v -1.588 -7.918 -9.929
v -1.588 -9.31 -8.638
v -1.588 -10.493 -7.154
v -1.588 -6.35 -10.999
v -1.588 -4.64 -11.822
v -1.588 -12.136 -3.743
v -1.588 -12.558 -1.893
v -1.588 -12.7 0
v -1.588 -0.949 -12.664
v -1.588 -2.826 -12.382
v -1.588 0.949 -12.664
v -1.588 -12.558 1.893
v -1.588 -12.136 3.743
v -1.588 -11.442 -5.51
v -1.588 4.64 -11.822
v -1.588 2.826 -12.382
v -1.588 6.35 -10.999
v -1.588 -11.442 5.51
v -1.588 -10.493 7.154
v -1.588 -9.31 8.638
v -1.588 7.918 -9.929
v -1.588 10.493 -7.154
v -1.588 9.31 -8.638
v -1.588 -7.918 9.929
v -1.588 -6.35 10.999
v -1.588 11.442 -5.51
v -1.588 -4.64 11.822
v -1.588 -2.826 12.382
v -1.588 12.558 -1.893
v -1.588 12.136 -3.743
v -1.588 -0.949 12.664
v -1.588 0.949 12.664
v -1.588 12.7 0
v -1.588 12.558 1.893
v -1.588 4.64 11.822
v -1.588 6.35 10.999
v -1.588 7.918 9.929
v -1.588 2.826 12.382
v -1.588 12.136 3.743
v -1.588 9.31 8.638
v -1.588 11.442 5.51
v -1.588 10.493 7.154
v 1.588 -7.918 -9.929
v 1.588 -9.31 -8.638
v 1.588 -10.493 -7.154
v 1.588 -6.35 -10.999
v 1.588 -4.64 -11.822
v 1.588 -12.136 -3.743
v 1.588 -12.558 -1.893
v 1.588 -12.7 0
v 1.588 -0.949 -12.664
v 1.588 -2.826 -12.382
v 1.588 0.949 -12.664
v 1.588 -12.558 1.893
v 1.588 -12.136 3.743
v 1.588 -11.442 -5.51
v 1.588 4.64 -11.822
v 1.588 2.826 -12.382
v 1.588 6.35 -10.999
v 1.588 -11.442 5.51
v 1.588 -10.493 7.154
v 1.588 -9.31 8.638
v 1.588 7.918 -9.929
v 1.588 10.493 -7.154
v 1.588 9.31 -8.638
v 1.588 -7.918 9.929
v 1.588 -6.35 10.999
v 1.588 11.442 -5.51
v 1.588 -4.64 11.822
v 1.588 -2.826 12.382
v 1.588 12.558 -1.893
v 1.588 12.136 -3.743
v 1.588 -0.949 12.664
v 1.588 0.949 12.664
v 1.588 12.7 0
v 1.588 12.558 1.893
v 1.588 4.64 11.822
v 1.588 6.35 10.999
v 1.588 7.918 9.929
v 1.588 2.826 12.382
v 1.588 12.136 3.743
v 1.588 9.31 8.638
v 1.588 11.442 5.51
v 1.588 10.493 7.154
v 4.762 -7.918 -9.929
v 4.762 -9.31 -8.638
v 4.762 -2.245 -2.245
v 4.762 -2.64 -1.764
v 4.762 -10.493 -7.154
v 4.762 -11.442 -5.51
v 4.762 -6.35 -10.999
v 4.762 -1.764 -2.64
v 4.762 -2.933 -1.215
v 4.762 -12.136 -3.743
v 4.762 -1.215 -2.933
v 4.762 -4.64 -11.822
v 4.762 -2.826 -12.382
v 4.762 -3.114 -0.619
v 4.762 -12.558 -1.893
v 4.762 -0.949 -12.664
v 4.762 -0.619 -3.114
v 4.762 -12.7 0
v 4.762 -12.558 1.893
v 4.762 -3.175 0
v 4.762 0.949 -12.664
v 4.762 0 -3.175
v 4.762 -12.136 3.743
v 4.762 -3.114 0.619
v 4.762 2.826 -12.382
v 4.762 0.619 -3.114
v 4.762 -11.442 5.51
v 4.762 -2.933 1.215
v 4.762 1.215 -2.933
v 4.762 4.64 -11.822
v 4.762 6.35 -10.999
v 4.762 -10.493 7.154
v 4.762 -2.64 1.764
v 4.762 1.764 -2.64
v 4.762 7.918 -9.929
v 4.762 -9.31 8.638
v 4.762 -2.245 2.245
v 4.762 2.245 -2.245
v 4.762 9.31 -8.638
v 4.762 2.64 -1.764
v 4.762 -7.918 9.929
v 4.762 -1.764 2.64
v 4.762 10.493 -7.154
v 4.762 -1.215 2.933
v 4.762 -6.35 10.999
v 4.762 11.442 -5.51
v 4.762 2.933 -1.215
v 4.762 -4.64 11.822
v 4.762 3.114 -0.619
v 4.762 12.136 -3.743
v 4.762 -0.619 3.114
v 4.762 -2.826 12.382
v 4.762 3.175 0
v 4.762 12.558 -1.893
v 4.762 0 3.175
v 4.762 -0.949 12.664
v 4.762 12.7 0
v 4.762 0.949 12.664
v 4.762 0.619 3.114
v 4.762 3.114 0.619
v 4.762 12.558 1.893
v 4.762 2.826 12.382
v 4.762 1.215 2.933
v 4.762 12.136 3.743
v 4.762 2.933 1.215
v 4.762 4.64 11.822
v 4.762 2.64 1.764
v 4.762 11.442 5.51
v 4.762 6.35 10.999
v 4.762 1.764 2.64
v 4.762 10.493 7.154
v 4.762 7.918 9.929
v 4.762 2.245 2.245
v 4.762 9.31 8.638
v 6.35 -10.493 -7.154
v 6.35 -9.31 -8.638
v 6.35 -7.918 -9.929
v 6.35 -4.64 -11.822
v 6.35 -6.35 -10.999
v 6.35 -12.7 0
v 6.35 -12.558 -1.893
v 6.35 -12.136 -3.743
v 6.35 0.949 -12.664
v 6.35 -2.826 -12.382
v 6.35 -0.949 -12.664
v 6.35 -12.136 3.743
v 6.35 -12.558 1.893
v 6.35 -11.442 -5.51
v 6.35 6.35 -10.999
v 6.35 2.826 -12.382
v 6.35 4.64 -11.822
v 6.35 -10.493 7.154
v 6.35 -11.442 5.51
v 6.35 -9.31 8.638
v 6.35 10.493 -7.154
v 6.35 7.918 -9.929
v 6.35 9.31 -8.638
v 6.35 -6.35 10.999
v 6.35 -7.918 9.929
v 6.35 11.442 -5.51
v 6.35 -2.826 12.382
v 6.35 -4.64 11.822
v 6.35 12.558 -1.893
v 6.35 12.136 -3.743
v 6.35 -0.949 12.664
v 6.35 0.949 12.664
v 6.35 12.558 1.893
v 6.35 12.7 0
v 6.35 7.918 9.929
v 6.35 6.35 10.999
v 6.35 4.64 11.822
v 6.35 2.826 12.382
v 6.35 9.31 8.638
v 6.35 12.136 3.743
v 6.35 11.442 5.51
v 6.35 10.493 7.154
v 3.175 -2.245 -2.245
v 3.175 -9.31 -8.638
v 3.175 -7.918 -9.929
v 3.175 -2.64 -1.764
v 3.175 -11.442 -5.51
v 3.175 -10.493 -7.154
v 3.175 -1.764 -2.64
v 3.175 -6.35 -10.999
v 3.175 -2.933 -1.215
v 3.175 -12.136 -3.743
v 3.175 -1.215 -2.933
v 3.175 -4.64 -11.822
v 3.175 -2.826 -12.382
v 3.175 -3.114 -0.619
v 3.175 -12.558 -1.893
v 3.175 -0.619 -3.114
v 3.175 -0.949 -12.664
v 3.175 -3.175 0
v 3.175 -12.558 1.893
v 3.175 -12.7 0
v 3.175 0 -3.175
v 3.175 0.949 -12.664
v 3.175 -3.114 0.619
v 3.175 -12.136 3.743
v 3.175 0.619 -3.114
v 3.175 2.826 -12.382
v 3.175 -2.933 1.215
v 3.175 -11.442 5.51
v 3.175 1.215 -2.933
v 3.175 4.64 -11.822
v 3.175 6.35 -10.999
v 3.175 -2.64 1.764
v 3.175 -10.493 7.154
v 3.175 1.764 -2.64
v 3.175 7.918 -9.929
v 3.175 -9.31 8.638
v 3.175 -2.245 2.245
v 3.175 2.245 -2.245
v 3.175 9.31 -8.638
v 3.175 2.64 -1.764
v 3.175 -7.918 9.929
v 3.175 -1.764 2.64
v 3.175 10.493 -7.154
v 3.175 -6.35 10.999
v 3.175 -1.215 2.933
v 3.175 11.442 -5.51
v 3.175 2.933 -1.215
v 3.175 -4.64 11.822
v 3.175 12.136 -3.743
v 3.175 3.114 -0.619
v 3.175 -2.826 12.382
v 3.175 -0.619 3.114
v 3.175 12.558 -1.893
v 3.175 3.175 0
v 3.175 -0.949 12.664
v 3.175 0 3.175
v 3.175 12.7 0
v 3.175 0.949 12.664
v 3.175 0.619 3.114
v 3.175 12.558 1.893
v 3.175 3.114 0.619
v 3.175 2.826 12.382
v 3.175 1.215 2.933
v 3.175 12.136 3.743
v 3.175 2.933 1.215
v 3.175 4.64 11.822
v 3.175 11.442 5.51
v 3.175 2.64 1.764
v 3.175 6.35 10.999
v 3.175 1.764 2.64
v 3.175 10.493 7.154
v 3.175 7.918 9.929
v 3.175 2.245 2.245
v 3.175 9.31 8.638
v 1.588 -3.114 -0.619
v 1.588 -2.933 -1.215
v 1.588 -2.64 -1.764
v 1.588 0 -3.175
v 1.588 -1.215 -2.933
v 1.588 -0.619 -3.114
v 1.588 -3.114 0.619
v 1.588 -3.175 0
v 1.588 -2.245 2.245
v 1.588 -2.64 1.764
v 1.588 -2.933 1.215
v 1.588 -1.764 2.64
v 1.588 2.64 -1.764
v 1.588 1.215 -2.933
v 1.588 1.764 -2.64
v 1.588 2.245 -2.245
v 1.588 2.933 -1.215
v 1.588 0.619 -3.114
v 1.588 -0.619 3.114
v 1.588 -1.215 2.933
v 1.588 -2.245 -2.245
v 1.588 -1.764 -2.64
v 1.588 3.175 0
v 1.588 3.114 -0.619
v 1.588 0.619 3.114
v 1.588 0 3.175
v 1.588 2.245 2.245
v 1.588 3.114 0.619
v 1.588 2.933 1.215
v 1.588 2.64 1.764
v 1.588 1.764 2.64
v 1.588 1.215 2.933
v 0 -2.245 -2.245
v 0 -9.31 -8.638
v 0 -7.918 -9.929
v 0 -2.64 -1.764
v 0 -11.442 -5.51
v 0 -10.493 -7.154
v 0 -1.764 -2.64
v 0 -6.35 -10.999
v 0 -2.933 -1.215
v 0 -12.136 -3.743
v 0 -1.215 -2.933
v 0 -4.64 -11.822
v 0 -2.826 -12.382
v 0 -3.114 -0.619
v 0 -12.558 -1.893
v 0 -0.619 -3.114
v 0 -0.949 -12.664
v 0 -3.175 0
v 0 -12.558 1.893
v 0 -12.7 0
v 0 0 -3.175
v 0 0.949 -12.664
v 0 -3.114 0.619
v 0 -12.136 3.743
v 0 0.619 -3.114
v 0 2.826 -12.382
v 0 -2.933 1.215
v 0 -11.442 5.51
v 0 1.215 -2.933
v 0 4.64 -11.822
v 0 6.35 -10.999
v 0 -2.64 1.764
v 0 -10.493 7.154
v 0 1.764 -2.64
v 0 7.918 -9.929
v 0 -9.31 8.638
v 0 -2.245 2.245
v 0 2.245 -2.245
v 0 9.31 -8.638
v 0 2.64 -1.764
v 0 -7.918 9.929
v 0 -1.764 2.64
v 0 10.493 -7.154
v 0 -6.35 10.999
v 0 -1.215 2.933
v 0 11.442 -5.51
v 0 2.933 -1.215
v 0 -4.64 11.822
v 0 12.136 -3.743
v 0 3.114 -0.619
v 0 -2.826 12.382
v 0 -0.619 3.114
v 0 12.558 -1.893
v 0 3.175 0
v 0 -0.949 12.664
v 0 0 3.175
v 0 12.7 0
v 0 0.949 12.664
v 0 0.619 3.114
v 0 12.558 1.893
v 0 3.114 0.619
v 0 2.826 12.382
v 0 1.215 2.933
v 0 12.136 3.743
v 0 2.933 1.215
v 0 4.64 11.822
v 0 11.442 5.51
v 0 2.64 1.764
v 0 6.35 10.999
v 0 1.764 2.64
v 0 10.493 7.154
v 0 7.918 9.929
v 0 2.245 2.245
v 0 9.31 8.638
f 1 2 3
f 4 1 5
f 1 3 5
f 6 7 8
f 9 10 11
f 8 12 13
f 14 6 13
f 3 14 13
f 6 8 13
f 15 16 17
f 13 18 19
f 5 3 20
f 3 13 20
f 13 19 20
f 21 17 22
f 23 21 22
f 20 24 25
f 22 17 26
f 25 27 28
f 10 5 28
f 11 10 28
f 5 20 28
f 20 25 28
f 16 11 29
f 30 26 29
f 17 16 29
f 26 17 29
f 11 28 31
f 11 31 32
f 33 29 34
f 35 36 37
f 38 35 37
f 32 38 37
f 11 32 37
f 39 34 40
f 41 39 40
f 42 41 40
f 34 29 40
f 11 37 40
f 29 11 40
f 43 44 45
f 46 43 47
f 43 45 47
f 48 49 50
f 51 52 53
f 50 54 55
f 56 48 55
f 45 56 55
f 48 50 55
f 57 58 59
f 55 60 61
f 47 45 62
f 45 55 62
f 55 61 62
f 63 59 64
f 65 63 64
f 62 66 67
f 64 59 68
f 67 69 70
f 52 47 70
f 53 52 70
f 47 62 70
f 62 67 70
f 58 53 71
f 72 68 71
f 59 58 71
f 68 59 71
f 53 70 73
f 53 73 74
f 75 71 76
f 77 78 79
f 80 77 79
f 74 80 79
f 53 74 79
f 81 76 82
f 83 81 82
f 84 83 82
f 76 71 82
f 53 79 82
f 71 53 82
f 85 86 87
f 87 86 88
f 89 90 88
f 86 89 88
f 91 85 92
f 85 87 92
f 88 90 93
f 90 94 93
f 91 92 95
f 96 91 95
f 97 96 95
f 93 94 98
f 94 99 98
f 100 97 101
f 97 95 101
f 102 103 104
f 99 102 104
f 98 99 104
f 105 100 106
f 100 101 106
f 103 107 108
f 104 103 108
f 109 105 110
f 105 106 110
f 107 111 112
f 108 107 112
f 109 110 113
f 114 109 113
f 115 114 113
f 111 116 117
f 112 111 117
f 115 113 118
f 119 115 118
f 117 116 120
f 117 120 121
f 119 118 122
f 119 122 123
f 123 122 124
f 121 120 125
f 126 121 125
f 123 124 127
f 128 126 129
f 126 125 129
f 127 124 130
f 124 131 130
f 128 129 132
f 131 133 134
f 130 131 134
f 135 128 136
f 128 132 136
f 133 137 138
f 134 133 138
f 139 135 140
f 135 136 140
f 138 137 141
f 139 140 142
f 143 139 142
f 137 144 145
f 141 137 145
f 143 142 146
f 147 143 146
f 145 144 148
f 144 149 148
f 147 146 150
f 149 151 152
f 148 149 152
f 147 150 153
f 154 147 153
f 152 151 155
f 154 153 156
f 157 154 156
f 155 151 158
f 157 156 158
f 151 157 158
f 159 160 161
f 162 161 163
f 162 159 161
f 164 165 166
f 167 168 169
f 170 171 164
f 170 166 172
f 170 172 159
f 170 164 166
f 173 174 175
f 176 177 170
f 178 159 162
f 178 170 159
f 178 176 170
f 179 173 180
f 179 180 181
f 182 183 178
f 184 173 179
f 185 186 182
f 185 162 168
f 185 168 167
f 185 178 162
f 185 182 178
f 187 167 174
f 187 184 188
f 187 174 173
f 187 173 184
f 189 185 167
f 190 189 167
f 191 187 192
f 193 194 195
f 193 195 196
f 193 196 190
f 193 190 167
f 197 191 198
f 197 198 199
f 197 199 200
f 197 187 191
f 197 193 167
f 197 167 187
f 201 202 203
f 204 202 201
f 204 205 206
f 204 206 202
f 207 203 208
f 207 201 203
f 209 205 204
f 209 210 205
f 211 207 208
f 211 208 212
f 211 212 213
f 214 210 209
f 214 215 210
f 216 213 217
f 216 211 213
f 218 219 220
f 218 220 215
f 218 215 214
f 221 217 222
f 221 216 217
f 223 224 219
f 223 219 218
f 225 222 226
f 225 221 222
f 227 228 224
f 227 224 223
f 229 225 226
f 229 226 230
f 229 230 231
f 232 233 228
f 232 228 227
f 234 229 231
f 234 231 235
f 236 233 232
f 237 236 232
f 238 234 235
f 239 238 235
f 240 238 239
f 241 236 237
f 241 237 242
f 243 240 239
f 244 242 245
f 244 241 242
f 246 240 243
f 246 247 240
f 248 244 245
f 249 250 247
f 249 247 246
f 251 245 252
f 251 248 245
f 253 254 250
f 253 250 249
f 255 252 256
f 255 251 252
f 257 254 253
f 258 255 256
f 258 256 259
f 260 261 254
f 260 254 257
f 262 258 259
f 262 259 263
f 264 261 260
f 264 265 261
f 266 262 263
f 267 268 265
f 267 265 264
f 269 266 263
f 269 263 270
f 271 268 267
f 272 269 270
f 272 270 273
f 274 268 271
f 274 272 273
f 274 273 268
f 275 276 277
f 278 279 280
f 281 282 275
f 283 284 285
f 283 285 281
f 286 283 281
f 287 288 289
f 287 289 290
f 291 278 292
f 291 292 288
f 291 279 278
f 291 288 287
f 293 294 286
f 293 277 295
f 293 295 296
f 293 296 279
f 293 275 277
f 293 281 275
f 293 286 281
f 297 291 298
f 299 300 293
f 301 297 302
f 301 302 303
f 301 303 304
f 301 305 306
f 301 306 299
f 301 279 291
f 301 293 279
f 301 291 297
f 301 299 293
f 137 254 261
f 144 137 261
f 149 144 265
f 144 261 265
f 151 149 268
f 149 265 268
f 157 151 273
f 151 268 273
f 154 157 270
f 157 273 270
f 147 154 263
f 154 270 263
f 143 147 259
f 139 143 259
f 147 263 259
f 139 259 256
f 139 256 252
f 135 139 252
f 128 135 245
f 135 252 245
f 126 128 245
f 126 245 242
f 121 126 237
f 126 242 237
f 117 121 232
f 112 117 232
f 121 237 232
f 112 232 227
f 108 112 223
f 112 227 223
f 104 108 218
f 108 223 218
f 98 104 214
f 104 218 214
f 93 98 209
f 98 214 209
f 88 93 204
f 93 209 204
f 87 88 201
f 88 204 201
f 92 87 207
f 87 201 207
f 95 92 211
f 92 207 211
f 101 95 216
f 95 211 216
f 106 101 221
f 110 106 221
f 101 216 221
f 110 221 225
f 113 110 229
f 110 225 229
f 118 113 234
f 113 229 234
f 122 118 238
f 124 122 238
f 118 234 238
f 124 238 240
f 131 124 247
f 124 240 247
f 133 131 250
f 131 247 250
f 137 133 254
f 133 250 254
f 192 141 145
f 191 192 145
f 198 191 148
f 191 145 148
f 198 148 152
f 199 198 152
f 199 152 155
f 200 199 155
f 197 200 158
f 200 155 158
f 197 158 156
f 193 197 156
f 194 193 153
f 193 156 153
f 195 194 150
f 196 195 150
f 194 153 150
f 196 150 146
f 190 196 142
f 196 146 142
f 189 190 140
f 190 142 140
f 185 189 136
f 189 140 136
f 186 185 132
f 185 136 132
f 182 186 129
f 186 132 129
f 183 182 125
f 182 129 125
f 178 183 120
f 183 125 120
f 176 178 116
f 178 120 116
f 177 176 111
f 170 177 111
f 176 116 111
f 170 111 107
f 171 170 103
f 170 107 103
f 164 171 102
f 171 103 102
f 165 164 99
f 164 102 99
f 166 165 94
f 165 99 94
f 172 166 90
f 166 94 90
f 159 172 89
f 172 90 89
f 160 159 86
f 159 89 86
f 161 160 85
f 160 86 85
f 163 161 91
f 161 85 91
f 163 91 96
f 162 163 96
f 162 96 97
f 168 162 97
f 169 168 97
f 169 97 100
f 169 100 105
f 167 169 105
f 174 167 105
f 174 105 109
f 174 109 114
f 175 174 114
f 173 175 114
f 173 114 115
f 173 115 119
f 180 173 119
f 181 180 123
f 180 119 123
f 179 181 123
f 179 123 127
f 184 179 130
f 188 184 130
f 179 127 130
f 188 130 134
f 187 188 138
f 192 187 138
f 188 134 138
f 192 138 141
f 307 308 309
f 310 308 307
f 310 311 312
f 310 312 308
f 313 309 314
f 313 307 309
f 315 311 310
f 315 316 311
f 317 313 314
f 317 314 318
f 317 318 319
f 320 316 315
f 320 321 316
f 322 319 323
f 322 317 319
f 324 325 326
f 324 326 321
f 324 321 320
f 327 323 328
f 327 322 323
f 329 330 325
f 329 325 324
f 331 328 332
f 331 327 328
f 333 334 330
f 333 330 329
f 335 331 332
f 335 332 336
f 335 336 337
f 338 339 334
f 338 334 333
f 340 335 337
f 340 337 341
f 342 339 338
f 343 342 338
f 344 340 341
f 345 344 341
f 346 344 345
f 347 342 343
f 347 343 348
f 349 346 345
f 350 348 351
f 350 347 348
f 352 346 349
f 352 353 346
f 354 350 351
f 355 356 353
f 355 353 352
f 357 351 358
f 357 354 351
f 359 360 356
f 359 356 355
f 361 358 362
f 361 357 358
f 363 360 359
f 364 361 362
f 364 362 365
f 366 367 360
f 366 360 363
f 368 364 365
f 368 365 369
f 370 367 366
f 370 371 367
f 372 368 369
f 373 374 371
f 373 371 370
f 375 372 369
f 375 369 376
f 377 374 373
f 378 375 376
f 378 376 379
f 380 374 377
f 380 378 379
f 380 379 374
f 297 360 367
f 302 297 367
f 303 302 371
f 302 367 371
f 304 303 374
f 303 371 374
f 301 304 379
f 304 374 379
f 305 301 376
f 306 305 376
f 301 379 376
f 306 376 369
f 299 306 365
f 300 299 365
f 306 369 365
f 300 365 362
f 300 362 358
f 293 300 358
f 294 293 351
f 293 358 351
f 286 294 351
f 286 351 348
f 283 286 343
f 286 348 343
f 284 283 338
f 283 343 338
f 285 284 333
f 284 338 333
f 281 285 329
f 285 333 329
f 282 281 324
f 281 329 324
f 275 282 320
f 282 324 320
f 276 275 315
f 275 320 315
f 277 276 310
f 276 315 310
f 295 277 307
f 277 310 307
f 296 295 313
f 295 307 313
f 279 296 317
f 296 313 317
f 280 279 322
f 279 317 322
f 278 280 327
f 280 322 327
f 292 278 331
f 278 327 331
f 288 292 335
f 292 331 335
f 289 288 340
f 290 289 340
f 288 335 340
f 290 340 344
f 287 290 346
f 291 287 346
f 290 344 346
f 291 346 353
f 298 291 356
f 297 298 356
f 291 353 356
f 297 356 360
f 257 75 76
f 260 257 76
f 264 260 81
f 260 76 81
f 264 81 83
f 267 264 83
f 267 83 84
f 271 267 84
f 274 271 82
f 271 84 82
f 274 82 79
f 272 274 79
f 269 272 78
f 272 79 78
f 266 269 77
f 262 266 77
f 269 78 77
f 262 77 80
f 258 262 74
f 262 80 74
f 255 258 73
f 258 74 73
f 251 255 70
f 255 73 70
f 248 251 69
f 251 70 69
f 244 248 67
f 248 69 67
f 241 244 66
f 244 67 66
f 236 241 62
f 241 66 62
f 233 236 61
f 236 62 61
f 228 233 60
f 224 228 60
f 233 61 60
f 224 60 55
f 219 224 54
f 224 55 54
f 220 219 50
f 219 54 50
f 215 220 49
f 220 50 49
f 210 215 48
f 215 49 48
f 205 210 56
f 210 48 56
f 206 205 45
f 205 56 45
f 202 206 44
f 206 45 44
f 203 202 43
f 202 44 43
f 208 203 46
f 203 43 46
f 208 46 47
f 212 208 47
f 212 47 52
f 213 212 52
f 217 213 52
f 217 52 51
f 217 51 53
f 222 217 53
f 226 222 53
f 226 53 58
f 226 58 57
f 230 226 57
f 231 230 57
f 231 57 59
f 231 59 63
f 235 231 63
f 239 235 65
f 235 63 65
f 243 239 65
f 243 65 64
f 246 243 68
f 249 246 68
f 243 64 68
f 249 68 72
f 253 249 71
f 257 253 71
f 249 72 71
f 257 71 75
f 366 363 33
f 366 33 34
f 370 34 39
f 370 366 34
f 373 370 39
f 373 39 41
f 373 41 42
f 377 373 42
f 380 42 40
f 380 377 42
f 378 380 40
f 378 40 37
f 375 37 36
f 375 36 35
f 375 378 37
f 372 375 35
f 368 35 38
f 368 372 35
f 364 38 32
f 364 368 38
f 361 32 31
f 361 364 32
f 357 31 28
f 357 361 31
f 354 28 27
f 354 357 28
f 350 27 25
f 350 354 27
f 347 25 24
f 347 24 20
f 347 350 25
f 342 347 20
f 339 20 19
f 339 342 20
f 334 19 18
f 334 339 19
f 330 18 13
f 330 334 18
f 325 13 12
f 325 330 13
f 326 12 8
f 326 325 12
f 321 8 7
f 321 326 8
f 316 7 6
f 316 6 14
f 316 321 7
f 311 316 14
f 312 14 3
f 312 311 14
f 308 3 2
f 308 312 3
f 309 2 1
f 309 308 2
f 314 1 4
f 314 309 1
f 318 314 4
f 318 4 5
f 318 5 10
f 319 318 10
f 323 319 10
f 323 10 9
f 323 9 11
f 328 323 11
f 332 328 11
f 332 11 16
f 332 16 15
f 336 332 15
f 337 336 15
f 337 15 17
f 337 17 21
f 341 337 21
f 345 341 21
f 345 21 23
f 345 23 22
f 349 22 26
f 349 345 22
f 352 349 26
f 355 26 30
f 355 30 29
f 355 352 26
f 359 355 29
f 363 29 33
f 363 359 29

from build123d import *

# Parameters (mm, degrees)
F0_R     = 12.7
F1_DEPTH = 1.5875
F2_R     = 3.175
F3_DEPTH = 1.5875
F4_R     = 12.7
F4_R_2   = 3.175
F5_DEPTH = 1.5875
F6_R     = 3.175
F7_DEPTH = 1.5875
F8_R     = 12.7
F8_R_2   = 3.175
F9_DEPTH = 1.5875


with BuildPart() as f1:
    # F0 (on Right) → F1 (new body)
    with BuildSketch(Plane.YZ):
        Circle(F0_R)
    extrude(amount=-F1_DEPTH)

    # F2 (on face) → F3 (join)
    with BuildSketch(Plane.YZ):
        Circle(F2_R)
    extrude(amount=F3_DEPTH)


with BuildPart() as f5:
    # F4 (on face) → F5 (new body)
    with BuildSketch(Plane.YZ.offset(1.5875)):
        Circle(F4_R)
        Circle(F4_R_2, mode=Mode.SUBTRACT)
        Circle(F4_R_2)
    extrude(amount=F5_DEPTH)

    # F6 (on face) → F7 (join)
    with BuildSketch(Plane.YZ.offset(3.175)):
        Circle(F6_R)
    extrude(amount=F7_DEPTH)

    # F8 (on face) → F9 (join)
    with BuildSketch(Plane.YZ.offset(4.7625)):
        Circle(F8_R)
        Circle(F8_R_2, mode=Mode.SUBTRACT)
        Circle(F8_R_2)
    extrude(amount=F9_DEPTH)


solid = Compound([f1.part, f5.part])
